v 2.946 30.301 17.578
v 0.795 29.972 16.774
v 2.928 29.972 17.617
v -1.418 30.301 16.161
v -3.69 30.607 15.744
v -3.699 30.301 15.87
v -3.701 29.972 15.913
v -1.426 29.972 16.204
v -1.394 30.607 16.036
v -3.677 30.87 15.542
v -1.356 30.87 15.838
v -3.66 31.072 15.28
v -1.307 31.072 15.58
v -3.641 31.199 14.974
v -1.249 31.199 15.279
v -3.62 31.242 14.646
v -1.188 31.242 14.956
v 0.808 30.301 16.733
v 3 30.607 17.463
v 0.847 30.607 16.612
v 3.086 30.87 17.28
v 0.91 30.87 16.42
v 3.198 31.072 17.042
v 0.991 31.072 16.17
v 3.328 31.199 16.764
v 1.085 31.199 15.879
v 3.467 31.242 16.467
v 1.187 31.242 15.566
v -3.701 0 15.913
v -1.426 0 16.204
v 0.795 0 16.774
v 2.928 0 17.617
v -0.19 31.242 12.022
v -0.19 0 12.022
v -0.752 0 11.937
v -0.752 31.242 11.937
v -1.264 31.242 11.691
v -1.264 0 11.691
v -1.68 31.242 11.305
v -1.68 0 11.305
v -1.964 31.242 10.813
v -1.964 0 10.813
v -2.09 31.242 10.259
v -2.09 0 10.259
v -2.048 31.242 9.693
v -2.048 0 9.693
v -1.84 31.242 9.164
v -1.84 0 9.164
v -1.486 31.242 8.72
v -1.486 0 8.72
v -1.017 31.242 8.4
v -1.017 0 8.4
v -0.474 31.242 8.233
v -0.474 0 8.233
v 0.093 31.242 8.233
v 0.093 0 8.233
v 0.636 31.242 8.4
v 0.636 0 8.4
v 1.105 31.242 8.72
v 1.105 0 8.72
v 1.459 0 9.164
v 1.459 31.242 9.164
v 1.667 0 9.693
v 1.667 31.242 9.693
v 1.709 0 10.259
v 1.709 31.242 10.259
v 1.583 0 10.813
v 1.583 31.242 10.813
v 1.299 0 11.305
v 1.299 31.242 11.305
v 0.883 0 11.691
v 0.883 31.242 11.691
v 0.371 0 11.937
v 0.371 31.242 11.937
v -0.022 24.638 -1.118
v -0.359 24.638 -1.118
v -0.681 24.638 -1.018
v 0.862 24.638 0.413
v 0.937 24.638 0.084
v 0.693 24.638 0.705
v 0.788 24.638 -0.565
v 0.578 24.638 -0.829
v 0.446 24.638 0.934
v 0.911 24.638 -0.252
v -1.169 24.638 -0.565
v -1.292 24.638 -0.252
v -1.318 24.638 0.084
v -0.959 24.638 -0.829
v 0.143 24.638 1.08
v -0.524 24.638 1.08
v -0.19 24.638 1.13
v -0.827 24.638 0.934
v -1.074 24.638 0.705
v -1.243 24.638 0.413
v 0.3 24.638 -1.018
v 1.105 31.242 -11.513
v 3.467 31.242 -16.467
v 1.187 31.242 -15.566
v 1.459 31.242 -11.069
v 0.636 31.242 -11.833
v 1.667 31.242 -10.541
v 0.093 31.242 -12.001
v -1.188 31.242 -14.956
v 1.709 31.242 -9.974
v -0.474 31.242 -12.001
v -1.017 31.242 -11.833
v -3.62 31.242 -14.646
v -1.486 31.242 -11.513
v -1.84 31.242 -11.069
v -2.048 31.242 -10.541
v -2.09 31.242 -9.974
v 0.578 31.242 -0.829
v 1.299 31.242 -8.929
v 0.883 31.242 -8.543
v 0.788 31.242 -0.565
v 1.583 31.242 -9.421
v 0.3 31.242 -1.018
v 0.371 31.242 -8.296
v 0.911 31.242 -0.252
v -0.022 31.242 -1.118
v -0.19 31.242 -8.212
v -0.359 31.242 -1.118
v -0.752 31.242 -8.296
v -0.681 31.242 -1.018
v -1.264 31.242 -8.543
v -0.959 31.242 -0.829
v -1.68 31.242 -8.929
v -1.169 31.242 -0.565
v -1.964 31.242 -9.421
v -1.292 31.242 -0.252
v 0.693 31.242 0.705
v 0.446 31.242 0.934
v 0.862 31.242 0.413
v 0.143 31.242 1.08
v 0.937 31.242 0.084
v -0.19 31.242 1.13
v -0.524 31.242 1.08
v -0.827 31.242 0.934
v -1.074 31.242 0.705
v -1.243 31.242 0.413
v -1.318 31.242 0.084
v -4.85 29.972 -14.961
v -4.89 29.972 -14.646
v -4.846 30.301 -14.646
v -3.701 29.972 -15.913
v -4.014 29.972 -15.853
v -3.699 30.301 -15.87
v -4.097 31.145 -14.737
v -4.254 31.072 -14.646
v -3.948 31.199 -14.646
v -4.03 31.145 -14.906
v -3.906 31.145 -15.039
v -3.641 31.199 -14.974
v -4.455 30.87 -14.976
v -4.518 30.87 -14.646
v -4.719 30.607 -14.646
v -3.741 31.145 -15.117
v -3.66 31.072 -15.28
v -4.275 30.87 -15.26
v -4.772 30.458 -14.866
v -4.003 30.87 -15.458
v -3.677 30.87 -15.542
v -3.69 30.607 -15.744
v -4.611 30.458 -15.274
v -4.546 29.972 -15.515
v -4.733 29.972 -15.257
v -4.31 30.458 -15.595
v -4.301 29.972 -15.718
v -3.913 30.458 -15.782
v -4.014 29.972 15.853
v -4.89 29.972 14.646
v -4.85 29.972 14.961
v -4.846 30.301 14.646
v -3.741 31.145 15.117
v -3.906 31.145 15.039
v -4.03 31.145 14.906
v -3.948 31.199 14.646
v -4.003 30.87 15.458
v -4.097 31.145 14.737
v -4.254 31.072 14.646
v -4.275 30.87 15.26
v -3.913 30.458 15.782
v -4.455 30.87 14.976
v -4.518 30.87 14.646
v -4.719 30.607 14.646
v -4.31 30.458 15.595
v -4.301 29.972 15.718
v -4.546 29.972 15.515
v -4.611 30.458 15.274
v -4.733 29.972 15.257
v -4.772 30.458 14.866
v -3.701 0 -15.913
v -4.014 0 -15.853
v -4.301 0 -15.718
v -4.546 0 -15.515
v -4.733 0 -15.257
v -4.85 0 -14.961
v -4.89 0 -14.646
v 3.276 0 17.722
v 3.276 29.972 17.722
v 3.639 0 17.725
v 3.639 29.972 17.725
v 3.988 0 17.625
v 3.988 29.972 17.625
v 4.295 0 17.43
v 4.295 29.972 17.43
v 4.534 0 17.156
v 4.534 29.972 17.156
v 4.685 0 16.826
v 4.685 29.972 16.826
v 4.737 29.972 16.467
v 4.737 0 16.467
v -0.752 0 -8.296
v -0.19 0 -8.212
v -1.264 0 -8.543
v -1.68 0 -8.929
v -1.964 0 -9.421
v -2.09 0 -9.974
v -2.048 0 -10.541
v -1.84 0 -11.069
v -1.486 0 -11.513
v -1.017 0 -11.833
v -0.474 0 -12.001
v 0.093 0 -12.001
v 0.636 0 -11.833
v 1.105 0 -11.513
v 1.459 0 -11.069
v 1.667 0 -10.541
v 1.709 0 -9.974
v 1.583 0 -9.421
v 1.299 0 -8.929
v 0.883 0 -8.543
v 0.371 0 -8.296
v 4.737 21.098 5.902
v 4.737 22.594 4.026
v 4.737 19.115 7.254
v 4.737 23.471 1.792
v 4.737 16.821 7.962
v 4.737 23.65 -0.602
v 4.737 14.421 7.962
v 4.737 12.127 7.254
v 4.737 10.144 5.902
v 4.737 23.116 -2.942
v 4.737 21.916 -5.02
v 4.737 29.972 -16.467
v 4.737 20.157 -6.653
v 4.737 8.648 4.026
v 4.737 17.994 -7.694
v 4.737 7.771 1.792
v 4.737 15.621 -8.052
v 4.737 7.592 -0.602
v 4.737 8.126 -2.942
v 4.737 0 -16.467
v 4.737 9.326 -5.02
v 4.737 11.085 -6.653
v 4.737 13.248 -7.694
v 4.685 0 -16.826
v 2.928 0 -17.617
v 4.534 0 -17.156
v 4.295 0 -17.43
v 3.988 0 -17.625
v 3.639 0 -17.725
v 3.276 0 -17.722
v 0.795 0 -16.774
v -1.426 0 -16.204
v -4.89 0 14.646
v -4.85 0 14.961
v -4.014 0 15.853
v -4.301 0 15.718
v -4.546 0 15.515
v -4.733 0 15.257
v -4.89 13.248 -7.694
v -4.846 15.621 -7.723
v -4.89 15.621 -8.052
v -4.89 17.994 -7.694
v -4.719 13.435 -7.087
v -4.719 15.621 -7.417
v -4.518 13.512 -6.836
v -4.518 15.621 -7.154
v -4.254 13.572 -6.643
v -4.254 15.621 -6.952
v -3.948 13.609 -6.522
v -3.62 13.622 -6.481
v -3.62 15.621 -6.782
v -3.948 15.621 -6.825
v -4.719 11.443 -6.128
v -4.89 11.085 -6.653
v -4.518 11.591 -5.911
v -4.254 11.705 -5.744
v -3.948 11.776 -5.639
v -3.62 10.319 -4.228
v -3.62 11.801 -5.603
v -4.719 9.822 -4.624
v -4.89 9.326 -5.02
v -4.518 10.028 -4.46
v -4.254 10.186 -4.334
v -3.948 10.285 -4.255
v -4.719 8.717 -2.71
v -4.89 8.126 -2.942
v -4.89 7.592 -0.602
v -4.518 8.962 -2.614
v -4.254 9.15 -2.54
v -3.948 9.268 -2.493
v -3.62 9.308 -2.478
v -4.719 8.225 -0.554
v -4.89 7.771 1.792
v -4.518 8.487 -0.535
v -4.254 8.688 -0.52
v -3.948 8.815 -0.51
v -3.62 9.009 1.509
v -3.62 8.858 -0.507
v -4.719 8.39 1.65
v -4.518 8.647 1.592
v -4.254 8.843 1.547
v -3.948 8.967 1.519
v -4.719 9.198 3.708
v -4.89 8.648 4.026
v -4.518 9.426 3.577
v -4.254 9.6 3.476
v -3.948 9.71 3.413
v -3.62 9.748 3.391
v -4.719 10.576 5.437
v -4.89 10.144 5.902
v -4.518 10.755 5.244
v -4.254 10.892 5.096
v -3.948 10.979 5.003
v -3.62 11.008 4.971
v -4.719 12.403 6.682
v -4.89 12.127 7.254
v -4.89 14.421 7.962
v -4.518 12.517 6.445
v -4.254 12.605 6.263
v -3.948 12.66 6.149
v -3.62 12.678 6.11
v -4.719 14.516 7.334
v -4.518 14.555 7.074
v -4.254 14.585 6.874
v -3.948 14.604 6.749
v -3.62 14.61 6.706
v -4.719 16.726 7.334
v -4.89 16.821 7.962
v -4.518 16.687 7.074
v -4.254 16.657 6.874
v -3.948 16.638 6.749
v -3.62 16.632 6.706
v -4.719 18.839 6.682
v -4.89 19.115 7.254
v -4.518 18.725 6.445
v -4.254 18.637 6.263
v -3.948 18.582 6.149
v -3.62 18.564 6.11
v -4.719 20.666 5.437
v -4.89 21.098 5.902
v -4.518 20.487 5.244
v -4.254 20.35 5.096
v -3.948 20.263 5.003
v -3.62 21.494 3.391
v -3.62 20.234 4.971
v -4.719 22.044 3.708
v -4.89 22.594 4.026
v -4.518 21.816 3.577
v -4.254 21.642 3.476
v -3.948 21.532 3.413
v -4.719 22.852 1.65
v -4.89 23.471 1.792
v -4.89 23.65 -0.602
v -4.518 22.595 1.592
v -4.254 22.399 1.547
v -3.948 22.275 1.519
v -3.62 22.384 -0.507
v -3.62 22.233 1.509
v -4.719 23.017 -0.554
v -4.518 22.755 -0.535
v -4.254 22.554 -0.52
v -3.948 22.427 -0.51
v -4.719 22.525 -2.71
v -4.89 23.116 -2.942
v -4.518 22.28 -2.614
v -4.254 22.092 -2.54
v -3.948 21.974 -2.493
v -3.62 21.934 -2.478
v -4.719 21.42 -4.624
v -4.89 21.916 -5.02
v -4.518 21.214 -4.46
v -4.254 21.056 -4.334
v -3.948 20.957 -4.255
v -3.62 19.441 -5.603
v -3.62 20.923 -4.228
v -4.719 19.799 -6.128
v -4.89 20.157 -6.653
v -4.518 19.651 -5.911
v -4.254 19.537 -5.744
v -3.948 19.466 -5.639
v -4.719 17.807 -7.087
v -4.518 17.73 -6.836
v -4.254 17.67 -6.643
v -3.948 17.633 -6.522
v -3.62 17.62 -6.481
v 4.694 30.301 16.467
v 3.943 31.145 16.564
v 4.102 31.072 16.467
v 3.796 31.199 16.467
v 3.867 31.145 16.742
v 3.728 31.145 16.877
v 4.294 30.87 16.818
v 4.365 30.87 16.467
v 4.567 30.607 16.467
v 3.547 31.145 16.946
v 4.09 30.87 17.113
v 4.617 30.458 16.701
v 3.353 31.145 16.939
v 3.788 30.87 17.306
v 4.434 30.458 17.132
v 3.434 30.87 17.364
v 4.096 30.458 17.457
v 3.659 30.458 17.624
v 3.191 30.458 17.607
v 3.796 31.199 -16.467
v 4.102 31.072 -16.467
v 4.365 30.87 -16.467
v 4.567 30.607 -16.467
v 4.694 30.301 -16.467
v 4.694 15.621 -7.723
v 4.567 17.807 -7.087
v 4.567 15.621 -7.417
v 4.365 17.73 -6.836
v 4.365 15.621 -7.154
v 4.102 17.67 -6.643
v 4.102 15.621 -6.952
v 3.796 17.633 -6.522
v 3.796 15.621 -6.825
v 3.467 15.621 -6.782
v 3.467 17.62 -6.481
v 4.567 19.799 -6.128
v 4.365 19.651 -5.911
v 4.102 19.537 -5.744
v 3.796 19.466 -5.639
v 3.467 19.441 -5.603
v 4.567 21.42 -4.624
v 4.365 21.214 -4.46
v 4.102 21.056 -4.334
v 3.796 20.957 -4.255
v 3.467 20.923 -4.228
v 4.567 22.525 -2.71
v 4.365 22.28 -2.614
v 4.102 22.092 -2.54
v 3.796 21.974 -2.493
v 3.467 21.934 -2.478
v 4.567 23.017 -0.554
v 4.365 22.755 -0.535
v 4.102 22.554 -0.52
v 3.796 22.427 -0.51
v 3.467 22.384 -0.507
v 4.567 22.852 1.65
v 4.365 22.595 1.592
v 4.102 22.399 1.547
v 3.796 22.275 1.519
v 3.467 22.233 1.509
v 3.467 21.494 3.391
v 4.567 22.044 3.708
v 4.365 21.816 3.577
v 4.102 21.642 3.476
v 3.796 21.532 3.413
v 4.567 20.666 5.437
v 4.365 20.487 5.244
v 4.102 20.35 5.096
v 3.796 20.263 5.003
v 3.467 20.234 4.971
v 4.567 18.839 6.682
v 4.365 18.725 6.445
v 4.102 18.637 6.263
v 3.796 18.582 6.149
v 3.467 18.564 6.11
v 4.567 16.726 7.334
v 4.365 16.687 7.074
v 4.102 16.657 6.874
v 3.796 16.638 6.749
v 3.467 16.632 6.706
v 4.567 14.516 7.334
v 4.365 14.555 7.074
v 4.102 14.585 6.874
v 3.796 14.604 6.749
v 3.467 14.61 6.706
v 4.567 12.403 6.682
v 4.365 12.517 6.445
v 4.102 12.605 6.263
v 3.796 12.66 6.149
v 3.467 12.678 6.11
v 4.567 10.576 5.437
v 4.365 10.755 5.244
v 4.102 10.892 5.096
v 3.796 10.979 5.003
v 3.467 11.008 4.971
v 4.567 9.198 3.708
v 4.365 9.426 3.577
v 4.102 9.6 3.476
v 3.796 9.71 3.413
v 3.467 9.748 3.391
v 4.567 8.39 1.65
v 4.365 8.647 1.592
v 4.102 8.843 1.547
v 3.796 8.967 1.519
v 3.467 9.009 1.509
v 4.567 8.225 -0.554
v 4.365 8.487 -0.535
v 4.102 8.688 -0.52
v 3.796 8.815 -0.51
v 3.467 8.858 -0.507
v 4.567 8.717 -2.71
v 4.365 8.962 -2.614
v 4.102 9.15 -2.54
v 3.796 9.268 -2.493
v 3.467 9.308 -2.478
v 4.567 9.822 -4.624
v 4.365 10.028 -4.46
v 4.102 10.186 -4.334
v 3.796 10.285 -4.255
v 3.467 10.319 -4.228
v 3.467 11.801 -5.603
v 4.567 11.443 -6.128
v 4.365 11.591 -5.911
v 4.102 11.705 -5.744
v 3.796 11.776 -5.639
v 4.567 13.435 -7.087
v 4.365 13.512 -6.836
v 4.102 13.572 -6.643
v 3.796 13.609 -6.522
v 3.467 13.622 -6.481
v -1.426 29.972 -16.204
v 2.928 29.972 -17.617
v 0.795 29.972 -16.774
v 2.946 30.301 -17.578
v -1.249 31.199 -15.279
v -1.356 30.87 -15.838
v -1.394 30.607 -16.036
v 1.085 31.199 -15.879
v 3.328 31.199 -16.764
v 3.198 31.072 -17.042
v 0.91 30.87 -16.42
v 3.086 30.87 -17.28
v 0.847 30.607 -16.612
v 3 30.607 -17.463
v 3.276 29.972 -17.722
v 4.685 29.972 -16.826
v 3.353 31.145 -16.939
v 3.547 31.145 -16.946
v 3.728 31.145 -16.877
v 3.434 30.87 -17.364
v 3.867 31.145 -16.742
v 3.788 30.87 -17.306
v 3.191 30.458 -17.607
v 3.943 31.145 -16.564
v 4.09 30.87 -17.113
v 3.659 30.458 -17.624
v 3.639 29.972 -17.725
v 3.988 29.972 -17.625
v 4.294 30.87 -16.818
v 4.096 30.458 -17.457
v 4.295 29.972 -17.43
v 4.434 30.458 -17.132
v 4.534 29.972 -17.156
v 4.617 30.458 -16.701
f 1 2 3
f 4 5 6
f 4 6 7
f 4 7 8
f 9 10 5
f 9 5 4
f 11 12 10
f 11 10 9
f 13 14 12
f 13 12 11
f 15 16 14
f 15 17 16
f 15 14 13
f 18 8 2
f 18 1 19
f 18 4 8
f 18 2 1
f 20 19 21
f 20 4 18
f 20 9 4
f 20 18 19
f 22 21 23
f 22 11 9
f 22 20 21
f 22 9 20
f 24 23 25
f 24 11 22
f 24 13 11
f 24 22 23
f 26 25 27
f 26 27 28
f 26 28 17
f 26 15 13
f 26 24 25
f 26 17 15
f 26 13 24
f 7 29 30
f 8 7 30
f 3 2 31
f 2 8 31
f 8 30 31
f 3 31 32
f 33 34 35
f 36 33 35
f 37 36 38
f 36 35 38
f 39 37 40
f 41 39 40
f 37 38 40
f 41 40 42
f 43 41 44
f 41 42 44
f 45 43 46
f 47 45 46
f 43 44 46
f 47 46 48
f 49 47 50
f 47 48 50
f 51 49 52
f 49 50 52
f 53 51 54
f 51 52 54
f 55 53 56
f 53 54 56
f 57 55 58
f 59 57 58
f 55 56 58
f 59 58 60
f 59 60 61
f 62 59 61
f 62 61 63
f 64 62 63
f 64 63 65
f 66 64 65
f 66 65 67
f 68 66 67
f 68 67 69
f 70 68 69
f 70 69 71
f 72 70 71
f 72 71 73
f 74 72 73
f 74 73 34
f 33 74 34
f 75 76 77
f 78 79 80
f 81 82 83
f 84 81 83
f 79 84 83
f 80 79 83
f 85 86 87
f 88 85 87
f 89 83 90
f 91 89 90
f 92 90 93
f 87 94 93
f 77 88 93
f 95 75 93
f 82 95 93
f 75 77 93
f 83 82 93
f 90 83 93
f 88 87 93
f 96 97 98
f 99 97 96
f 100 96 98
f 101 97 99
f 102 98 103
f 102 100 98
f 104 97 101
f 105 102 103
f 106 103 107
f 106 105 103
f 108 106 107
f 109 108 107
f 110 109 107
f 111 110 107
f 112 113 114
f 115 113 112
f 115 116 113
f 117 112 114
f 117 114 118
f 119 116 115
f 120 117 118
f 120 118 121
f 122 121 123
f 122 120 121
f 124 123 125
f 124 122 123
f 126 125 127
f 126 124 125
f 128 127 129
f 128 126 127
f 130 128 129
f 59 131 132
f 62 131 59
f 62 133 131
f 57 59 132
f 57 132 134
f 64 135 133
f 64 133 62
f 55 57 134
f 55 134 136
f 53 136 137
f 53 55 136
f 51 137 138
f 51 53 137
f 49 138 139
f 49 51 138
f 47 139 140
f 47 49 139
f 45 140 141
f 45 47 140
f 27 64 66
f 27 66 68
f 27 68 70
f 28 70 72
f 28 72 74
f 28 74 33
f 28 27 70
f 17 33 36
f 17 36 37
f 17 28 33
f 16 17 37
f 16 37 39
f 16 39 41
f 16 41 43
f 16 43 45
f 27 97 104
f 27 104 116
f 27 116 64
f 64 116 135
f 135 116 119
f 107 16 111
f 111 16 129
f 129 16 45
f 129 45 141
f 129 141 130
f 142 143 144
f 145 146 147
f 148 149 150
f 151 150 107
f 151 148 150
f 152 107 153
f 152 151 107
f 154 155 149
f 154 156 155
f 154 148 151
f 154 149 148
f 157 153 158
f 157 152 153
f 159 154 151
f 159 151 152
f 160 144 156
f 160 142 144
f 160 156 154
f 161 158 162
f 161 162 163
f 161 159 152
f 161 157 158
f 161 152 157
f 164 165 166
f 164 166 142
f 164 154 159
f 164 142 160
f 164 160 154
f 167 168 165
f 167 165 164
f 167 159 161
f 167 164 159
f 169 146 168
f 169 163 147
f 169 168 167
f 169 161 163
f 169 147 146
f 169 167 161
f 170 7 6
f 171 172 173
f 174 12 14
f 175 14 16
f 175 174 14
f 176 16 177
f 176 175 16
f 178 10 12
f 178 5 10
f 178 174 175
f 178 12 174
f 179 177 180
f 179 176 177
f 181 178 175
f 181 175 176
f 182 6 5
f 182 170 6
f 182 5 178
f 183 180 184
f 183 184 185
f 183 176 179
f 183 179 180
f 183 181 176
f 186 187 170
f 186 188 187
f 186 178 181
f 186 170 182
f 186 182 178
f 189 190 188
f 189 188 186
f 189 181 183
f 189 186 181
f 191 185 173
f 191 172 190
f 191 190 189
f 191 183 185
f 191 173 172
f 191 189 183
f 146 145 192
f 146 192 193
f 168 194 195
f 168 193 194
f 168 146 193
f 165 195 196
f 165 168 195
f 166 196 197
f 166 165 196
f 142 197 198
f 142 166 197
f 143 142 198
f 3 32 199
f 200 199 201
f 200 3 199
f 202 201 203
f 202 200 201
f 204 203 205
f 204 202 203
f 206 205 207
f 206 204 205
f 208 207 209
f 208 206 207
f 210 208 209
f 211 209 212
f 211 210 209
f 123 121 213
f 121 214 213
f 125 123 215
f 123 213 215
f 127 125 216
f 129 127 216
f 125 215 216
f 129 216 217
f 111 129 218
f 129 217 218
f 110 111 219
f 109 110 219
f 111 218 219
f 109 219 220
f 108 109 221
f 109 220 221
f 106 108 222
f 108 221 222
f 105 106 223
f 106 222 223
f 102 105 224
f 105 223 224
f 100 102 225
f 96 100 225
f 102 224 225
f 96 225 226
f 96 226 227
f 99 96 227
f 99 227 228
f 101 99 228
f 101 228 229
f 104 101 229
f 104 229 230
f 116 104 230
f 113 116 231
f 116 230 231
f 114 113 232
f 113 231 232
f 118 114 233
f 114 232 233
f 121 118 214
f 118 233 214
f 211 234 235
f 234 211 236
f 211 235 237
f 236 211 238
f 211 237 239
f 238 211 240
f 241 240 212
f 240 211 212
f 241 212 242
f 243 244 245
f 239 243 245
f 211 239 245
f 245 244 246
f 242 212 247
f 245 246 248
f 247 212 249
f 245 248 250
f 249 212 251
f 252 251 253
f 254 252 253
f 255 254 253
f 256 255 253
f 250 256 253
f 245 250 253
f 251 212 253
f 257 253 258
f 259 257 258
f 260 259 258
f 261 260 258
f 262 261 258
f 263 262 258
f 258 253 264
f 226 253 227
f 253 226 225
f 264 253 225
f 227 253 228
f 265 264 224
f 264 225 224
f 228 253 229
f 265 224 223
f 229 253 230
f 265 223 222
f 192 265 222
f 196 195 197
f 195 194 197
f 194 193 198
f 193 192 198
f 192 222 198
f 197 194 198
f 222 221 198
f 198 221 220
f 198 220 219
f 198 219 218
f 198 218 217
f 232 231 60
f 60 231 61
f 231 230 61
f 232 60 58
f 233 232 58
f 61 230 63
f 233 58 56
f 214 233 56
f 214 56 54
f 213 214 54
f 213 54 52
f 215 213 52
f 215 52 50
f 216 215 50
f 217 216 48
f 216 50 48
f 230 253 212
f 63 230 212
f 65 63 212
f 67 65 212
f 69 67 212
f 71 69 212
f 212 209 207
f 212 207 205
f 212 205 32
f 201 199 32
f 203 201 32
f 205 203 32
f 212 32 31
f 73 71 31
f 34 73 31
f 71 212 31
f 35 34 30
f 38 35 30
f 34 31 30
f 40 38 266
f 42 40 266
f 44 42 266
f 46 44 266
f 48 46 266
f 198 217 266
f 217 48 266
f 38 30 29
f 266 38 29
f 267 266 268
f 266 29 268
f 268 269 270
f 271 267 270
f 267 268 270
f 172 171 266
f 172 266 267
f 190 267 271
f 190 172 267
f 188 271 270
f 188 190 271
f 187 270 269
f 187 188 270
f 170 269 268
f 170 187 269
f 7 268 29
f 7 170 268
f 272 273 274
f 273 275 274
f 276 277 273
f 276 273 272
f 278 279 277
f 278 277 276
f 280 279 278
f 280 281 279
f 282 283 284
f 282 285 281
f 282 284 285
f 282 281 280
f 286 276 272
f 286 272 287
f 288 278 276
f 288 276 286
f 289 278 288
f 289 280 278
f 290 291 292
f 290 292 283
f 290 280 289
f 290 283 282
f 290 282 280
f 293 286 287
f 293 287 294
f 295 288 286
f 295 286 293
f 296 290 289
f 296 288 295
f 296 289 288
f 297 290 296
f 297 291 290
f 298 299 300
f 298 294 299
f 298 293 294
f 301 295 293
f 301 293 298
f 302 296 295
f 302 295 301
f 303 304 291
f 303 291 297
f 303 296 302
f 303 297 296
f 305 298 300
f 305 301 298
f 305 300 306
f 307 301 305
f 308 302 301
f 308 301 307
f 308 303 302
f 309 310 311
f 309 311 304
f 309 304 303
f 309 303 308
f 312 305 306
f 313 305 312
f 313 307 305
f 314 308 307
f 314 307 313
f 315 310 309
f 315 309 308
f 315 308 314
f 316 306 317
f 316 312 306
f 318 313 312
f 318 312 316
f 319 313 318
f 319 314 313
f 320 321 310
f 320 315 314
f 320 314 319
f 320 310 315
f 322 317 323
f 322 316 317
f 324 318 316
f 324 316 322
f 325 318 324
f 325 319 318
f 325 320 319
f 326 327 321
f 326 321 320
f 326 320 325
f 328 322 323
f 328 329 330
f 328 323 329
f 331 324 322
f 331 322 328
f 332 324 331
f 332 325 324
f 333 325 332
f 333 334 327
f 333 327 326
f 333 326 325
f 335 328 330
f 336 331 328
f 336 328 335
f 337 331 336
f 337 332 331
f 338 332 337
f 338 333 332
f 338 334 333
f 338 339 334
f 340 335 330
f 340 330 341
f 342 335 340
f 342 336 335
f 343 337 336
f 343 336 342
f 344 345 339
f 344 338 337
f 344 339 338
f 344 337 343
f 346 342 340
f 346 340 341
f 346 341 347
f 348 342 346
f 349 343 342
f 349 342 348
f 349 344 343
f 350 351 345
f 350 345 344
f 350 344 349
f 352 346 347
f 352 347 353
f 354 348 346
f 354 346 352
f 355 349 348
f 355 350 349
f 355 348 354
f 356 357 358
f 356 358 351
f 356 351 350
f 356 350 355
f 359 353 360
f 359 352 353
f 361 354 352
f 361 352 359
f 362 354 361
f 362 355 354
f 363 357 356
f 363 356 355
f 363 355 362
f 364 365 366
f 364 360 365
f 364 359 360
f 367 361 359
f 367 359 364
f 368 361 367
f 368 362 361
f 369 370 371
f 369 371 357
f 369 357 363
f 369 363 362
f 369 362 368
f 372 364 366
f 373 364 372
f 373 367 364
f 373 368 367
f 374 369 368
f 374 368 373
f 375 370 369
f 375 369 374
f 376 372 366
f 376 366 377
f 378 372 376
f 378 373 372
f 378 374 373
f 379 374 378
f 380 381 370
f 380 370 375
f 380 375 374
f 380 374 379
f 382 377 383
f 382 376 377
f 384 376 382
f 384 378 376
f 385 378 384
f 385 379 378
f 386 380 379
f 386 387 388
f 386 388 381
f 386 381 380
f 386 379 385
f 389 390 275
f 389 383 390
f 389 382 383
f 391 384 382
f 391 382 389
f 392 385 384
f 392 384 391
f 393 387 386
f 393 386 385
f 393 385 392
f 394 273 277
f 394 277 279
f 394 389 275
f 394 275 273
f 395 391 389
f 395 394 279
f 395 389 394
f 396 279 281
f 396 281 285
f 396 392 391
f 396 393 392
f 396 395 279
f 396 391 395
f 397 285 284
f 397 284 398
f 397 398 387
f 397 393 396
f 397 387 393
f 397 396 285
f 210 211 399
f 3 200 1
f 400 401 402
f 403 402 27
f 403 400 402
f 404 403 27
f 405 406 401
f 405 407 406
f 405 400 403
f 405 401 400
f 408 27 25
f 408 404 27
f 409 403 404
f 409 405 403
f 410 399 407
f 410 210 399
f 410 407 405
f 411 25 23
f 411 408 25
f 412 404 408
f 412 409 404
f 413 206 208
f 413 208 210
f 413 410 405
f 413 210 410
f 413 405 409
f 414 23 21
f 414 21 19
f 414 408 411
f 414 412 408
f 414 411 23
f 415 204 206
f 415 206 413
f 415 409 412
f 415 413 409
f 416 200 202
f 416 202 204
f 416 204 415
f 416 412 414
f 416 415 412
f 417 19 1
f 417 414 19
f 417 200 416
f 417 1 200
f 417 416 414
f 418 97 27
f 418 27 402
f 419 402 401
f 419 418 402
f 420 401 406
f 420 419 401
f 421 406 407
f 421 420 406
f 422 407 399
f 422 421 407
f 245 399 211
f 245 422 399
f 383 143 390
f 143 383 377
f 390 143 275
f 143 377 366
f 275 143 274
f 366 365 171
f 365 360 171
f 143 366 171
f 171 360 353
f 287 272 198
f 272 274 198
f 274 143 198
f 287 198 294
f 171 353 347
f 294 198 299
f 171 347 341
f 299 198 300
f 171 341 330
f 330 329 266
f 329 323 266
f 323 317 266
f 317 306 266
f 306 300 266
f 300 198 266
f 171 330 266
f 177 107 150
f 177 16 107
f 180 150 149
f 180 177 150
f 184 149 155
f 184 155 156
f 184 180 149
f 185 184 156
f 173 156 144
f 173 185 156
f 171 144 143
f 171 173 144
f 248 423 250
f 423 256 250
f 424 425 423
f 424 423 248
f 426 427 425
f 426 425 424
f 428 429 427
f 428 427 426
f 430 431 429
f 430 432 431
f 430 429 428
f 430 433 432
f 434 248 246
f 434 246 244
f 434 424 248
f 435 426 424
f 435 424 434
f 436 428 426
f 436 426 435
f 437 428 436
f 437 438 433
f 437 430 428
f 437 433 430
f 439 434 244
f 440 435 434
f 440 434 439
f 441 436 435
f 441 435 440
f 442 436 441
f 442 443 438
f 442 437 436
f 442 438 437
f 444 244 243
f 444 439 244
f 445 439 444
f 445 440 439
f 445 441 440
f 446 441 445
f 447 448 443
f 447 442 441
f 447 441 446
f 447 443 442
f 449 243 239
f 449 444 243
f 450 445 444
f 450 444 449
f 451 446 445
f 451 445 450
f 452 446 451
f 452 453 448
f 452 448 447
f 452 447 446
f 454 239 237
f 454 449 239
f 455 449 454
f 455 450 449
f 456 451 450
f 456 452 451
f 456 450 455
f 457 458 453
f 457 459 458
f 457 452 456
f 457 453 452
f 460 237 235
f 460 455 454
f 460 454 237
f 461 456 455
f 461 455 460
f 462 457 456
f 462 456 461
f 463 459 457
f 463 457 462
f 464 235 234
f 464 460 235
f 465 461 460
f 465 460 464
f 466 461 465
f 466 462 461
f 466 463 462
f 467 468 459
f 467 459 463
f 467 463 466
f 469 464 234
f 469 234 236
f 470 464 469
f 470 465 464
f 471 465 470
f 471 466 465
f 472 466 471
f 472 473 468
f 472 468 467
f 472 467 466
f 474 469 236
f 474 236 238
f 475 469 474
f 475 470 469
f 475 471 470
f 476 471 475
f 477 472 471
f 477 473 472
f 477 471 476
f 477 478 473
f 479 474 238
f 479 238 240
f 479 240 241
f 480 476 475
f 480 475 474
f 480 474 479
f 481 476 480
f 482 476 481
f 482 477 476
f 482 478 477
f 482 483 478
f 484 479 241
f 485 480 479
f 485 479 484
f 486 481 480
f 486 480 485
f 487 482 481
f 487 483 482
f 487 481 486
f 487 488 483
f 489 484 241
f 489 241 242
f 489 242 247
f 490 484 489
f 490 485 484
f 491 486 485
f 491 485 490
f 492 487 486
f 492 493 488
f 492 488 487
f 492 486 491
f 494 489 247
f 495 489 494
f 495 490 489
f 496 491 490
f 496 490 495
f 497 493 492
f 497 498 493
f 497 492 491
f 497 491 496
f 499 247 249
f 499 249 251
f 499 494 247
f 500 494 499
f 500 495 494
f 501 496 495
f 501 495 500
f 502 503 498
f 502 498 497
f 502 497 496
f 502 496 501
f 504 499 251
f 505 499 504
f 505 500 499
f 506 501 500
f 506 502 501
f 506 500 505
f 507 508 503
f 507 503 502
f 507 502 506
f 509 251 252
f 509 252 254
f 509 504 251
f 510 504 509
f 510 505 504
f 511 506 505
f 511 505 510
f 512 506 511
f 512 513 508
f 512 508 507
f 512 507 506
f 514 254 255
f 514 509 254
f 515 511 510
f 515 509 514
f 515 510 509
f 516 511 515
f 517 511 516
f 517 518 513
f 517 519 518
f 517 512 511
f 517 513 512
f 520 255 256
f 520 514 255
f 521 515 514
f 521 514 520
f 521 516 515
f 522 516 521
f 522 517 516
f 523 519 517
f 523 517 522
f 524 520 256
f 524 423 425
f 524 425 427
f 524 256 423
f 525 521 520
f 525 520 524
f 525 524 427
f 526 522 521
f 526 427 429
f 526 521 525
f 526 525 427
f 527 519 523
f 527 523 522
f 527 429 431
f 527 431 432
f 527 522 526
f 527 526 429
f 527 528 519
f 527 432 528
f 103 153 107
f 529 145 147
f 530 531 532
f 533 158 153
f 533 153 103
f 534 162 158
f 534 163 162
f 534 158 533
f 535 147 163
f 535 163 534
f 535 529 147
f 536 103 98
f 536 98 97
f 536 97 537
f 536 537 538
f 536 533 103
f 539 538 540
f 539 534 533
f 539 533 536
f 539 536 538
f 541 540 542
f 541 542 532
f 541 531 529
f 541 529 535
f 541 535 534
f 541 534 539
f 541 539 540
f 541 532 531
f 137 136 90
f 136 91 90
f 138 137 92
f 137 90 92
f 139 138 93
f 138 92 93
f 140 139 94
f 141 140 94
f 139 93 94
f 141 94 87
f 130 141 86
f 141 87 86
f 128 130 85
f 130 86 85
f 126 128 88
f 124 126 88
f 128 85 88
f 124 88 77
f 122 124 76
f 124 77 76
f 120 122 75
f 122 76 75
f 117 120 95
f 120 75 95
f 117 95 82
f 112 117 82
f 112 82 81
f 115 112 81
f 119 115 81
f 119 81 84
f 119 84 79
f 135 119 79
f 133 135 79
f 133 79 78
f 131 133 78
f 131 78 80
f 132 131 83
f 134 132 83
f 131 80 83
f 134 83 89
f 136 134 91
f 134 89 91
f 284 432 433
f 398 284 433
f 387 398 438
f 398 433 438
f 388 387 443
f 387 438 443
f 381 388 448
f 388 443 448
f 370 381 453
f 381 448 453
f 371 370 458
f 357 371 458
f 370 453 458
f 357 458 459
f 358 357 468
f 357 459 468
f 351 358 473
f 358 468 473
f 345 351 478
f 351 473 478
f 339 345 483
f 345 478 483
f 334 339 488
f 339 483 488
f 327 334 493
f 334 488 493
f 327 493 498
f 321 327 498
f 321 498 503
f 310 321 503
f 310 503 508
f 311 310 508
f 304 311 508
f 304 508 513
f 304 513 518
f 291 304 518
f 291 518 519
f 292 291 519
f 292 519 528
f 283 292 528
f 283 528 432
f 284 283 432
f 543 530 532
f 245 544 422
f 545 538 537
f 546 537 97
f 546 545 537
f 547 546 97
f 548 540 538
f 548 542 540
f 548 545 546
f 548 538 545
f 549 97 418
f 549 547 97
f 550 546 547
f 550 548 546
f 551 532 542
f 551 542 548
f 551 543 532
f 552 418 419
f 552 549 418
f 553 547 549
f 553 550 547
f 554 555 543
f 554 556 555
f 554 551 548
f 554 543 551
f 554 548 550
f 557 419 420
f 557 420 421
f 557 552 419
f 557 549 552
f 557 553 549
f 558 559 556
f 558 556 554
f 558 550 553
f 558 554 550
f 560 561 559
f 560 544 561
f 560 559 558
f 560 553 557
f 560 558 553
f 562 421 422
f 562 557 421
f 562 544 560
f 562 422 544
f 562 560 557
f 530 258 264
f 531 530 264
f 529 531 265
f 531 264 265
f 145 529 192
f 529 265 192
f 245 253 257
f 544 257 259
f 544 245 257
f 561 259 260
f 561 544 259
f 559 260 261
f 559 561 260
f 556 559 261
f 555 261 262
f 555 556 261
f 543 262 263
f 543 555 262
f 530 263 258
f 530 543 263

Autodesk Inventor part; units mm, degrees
ref_plane "YZ Plane" through (0, 0, 0) normal (1, 0, 0) x (0, 1, 0)
ref_plane "XZ Plane" through (0, 0, 0) normal (0, 1, 0) x (-1, 0, 0)
ref_plane "XY Plane" through (0, 0, 0) normal (0, 0, 1) x (1, 0, 0)
sketch "Sketch1" plane through (0, 0, 0) normal (0, 1, 0) x (-1, 0, 0)
  line L0 (-4.7371, 18.5916) -> (-4.7371, -18.5916)
  line L1 (4.8895, -15.875) -> (4.8895, 15.875)
  circle A0 centre (4.8895, -34.29) radius 18.415
  circle A1 centre (4.8895, 34.29) radius 18.415
  point P0 (0, 0)
  point P1 (4.8895, 0)
  dimension "d3" = 31.75
  dimension "d10" = 36.83
  dimension "d11" = 9.6266
  dimension "d12" = 4.8895
  dimension "d13" = 0
  dimension "d14" = 0
  dimension "d15" = 16.6109
extrude "Extrusion1" add sketch "Sketch1" along normal blind 31.242 contours A1 L1 A0 L0
sketch "Sketch2" plane through (4.7371, 0, 18.5916) normal (1, 0, 0) x (0, 0, -1)
  circle A0 centre (18.5916, 15.621) radius 6.7818
  line L0 (0, 31.242) -> (37.1831, 31.242) projected
  line L1 (0, 0) -> (0, 31.242) projected
  point P0 (18.5916, 0)
  point P1 (18.5916, 31.242)
  point P2 (0, 15.621)
  dimension "d39" = 13.5636
extrude "Extrusion2" cut sketch "Sketch2" against normal through all
fillet "Fillet1" radius 1.27 10 edges at (4.7371, 15.621, 6.7818) (-4.8895, 15.621, 6.7818) (4.7371, 31.242, 0) (4.7371, 15.621, -18.5916) (4.7371, 15.621, 18.5916) (-4.8895, 15.621, 15.875) (0.1118, 31.242, 16.5671) (0.1118, 31.242, -16.5671) (-4.8895, 31.242, 0) (-4.8895, 15.621, -15.875)
sketch "Sketch3" plane through (0, 31.242, 0) normal (0, 1, 0) x (1, 0, 0)
  arc A0 (2.928, -17.6167) -> (4.7371, -16.4668) centre (3.4671, -16.4668) ccw projected
  arc A1 (4.7371, 16.4668) -> (2.928, 17.6167) centre (3.4671, 16.4668) ccw projected
  line L0 (-4.8895, 14.646) -> (-4.8895, -14.646) projected
  point P0 (0, 0)
  point P1 (-0.1905, -10.1168)
  point P2 (-0.1905, 10.1168)
  dimension "d22" = 6.35
  dimension "d23" = 6.35
  dimension "d38" = 4.699
hole "Hole1" at (-0.1905, 31.242, 10.1168) at (-0.1905, 31.242, -10.1168) direction (0, -1, 0) diameter 3.81 end through all
sketch "Sketch4" plane through (0, 31.242, 0) normal (0, 1, 0) x (1, 0, 0)
  circle A0 centre (-0.1905, -10.1168) radius 1.905 projected
  circle A1 centre (-0.1905, 10.1168) radius 1.905 projected
  arc A2 (-3.6195, 14.646) -> (3.4671, 16.4668) centre (-4.8895, 34.29) ccw projected
  line L0 (-3.6195, -14.646) -> (-3.6195, 14.646) projected
  arc A3 (3.4671, -16.4668) -> (-3.6195, -14.646) centre (-4.8895, -34.29) ccw projected
  line L1 (3.4671, 16.4668) -> (3.4671, -16.4668) projected
  point P0 (0, 0)
  point P1 (-0.1905, 0)
hole "Hole2" at (-0.1905, 31.242, 0) direction (0, -1, 0) diameter 2.2606 depth 6.604
equation "\"d23\" = d22"
properties part number "BatteryBrace"
